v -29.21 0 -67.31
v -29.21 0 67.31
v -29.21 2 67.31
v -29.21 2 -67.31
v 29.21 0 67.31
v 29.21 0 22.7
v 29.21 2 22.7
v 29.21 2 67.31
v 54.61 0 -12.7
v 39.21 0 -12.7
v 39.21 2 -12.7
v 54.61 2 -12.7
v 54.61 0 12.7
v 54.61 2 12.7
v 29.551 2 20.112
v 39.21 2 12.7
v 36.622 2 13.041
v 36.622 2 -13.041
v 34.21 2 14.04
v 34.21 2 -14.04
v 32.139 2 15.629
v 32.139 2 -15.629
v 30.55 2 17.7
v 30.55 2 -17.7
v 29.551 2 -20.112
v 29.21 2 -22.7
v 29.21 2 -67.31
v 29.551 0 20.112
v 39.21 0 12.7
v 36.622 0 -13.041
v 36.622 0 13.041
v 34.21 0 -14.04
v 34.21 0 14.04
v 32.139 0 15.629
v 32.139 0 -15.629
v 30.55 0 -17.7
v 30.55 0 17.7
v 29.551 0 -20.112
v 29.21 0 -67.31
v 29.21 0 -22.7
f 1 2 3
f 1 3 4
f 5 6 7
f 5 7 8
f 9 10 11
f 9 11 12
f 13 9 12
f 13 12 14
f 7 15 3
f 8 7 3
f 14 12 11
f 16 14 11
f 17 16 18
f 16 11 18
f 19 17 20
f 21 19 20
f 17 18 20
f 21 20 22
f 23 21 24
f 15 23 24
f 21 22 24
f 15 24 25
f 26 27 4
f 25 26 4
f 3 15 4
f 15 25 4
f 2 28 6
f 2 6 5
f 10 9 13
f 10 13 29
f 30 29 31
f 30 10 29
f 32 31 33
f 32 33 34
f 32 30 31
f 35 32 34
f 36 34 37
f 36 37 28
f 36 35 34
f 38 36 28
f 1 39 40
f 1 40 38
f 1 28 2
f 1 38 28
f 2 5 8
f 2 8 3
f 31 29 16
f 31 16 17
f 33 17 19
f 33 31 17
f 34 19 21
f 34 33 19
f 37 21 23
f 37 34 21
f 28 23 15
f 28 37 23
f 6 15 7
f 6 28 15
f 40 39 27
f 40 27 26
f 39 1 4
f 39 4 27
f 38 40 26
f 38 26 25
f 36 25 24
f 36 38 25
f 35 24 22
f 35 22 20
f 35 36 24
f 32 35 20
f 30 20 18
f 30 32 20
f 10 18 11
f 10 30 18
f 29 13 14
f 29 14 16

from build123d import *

# Parameters (mm, degrees)
BOSS_EXTRUDE1_DEPTH = 2


with BuildPart() as part:
    # Sketch1 → Boss-Extrude1 (new body)
    with BuildSketch(Plane(origin=(0, 0, 0), x_dir=(1, 0, 0), z_dir=(0, 1, 0))):
        with BuildLine():
            Line((-29.21, 67.31), (29.21, 67.31))
            Line((29.21, 67.31), (29.21, 22.7))
            ThreePointArc((29.21, 22.7), (32.138932188, 15.628932188), (39.21, 12.7))
            Line((39.21, 12.7), (54.61, 12.7))
            Line((54.61, 12.7), (54.61, -12.7))
            Line((54.61, -12.7), (39.21, -12.7))
            ThreePointArc((39.21, -12.7), (32.138932188, -15.628932188), (29.21, -22.7))
            Line((29.21, -22.7), (29.21, -67.31))
            Line((29.21, -67.31), (-29.21, -67.31))
            Line((-29.21, -67.31), (-29.21, 67.31))
        make_face()
    extrude(amount=BOSS_EXTRUDE1_DEPTH)


solid = part.part
